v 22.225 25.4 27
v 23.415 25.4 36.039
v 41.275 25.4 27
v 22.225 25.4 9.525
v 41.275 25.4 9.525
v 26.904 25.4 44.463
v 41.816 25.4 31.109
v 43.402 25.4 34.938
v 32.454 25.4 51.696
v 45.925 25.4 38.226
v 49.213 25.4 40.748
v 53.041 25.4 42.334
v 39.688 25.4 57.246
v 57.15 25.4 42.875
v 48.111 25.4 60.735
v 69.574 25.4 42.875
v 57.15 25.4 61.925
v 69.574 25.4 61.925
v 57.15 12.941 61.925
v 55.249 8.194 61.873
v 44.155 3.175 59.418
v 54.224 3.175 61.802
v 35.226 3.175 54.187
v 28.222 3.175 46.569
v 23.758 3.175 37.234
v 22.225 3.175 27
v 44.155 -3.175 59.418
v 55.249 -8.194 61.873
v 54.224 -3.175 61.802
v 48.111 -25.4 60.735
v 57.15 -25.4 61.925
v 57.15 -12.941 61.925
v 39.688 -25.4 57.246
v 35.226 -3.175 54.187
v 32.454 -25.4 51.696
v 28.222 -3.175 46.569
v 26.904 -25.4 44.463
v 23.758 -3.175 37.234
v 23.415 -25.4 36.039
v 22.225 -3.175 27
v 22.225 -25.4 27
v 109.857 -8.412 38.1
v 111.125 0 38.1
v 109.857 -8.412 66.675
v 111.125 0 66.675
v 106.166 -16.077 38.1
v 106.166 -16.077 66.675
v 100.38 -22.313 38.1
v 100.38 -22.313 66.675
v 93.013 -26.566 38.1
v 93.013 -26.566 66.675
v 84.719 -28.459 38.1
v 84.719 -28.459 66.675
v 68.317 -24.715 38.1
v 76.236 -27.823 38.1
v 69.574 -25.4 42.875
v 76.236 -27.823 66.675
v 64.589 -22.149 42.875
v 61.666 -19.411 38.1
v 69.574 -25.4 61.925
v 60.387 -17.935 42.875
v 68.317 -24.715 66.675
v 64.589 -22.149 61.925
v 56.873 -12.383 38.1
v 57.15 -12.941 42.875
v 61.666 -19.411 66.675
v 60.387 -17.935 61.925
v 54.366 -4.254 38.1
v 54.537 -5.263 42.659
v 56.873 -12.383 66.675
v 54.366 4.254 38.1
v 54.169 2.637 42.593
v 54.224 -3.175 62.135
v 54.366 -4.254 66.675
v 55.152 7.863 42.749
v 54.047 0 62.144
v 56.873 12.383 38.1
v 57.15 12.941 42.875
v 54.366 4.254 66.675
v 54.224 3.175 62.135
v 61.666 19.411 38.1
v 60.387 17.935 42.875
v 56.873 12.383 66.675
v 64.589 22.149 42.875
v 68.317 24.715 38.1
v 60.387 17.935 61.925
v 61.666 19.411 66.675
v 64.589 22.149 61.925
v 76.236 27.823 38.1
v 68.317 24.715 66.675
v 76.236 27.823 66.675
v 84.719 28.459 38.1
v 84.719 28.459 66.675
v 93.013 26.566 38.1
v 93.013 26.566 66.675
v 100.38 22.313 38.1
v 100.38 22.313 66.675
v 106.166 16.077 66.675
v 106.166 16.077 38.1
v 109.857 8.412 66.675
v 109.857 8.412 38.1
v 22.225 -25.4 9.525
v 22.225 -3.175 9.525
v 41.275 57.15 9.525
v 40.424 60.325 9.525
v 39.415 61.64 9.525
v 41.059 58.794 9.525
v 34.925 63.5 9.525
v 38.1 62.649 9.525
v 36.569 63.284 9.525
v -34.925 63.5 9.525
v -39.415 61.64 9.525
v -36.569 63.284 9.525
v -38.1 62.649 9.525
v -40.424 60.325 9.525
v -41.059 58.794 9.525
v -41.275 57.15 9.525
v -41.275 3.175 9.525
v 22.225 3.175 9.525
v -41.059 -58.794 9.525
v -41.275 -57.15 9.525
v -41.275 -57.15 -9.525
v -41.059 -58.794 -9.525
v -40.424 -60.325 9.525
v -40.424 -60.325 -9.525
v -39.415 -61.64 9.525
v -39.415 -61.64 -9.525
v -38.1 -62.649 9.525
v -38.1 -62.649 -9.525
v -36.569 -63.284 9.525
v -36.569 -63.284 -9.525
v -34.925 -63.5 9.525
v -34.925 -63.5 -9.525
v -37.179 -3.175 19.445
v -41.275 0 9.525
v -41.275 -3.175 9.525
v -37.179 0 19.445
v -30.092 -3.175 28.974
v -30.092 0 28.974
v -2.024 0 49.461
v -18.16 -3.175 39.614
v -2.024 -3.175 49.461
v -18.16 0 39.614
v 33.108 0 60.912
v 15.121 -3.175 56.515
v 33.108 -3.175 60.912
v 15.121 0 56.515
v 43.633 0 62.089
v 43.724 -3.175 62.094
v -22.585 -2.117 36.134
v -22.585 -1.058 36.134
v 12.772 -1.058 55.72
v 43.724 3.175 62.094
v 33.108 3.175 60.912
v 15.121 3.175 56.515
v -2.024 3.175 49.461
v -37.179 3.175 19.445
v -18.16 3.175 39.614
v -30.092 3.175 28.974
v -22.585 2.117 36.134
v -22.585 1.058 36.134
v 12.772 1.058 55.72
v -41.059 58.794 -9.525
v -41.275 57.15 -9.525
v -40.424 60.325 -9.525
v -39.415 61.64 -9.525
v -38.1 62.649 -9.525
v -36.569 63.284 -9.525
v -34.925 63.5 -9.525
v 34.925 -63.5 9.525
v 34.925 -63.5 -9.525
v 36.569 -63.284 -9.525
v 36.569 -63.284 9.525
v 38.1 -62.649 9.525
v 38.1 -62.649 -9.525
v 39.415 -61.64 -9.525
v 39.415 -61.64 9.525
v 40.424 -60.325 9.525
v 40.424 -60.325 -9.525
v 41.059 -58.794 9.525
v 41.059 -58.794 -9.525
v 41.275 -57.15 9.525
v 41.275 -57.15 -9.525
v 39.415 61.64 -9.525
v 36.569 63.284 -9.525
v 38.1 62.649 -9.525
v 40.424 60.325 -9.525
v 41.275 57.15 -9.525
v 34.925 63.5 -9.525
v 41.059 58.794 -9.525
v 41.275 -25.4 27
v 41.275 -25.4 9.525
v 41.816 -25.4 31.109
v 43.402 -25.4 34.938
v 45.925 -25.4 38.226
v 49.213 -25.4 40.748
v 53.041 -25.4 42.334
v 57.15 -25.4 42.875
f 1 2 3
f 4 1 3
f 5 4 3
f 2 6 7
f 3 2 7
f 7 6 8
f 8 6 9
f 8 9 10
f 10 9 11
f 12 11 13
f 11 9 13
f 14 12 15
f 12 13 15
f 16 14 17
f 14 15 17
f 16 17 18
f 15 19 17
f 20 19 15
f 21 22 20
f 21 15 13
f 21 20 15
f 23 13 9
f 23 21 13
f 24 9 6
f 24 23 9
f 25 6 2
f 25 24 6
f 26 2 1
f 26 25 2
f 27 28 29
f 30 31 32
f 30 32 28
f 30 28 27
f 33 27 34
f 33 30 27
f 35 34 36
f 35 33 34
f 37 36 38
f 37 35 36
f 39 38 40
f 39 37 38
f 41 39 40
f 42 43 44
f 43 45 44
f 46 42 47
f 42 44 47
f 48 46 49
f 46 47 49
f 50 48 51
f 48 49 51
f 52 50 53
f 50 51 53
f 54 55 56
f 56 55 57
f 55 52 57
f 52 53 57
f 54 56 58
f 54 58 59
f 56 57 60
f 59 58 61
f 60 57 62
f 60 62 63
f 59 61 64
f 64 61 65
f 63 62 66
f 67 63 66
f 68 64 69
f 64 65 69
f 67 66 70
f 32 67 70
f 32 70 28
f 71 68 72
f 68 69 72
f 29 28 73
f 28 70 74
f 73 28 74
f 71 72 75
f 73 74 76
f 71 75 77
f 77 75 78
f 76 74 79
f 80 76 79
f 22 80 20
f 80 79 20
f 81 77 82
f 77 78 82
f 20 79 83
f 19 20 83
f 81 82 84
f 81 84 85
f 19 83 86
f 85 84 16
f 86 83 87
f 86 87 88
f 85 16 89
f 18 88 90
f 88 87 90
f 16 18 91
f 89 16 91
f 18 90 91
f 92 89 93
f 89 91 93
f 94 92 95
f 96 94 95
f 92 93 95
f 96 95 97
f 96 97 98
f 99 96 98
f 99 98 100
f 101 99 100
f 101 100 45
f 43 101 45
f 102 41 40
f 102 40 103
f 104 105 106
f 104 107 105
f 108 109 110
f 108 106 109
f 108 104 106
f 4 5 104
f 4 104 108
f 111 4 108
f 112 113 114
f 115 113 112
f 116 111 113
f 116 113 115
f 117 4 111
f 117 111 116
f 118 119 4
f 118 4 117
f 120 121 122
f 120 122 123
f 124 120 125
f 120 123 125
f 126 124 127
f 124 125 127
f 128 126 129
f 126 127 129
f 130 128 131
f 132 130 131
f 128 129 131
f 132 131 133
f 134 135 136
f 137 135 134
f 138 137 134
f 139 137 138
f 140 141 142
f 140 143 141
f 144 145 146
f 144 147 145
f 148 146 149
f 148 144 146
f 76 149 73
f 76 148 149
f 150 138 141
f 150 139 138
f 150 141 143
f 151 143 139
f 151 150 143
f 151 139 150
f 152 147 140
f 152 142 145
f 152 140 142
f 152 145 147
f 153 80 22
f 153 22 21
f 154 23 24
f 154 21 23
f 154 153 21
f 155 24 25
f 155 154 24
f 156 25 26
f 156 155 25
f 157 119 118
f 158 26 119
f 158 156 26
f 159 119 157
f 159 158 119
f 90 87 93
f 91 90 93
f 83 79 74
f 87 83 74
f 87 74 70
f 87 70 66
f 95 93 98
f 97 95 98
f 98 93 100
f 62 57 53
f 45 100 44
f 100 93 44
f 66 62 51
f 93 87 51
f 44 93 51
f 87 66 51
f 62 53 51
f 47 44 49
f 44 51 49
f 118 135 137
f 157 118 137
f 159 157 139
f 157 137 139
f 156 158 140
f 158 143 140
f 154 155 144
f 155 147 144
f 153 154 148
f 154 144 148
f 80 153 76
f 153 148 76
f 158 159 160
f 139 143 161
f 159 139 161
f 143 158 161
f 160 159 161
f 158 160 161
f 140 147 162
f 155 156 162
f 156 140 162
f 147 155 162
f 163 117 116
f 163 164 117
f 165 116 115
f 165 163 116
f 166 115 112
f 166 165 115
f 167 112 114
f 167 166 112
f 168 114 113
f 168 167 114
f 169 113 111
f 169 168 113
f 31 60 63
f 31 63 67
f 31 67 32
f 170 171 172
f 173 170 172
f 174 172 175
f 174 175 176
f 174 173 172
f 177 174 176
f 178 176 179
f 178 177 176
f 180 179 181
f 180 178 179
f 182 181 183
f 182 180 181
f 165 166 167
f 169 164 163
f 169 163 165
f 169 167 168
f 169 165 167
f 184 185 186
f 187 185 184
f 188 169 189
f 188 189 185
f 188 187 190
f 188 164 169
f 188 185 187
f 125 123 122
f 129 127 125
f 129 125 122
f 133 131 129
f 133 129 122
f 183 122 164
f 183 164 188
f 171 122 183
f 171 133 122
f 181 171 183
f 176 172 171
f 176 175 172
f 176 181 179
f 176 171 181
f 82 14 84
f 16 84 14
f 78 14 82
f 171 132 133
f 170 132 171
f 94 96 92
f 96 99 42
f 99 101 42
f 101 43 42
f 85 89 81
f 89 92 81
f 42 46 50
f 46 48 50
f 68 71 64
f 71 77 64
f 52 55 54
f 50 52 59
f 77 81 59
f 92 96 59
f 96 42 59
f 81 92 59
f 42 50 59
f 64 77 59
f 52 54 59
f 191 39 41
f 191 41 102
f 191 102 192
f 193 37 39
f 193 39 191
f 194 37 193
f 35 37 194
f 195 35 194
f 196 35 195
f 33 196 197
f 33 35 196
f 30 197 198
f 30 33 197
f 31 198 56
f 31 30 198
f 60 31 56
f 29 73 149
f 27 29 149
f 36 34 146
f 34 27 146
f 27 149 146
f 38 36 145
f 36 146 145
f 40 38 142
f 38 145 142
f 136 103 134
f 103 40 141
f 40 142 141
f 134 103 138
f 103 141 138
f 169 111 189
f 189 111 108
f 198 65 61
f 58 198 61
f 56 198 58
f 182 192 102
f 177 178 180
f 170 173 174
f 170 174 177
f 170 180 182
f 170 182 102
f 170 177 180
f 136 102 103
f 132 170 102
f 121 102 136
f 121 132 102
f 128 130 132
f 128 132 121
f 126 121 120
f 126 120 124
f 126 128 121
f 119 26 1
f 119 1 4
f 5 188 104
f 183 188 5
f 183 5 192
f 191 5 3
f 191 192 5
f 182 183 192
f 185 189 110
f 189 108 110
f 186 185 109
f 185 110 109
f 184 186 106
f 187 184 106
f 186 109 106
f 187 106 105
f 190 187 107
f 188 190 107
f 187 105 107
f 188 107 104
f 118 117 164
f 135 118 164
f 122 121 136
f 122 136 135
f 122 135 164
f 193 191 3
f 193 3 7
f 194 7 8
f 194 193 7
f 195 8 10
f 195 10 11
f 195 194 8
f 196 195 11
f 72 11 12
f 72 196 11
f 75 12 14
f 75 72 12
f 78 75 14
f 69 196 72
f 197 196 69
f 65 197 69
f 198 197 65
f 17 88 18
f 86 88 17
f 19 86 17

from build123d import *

# Parameters (mm, degrees)
F1_DEPTH = 63.5
F2_DEPTH = 3.175
F0_W     = 22.2610938409
F0_H     = 19.05
F3_DEPTH = 25.4
F5_DEPTH = 25.4
F6_R     = 6.35


with BuildPart() as f1:
    # F0 (on Front) → F1 (new body, symmetric)
    with BuildSketch(Plane.XZ):
        Polygon((-41.275, 9.525), (-41.275, -9.525), (41.275, -9.525), (41.275, 9.525), (22.225, 9.525), align=None)
    extrude(amount=F1_DEPTH, both=True)

    # F0 (on Front) → F2 (join, symmetric)
    with BuildSketch(Plane.XZ):
        with BuildLine():
            add(Edge.make_bspline(
                [(-41.275, 9.525), (-34.2779420316, 38.2648594677), (15.5508974567, 65.6356289983), (57.15, 61.9252)],
                knots=[0, 0, 0, 0, 111.5045361635, 111.5045361635, 111.5045361635, 111.5045361635], degree=3))
            Line((-41.275, 9.525), (22.225, 9.525))
            Line((22.225, 9.525), (22.225, 27.0002))
            ThreePointArc((22.225, 27.0002), (32.4542956671, 51.6959043329), (57.15, 61.9252))
        make_face()
    extrude(amount=F2_DEPTH, both=True)

    # F0 (on Front) → F3 (join, symmetric)
    with BuildSketch(Plane.XZ):
        with BuildLine():
            Line((22.225, 9.525), (41.275, 9.525))
            Line((41.275, 9.525), (41.275, 27.0002))
            ThreePointArc((41.275, 27.0002), (45.9246798487, 38.2255201513), (57.15, 42.8752))
            Line((57.15, 42.8752), (60.325, 42.8752))
            Line((60.325, 42.8752), (60.325, 61.9252))
            Line((60.325, 61.9252), (57.15, 61.9252))
            ThreePointArc((57.15, 61.9252), (32.4542956671, 51.6959043329), (22.225, 27.0002))
            Line((22.225, 27.0002), (22.225, 9.525))
        make_face()
        with Locations((71.4555469204, 52.4002)):
            Rectangle(F0_W, F0_H)
    extrude(amount=F3_DEPTH, both=True)

    # F0 (on Front) → F4 (revolve)
    with BuildSketch(Plane.XZ):
        Polygon((82.5860938409, 66.675), (82.5860938409, 61.9252), (82.5860938409, 42.8752), (82.5860938409, 38.1), (111.125, 38.1), (111.125, 66.675), align=None)
    revolve(axis=Axis((82.5860938409, 0, 52.3875), (0, 0, -1)))

    # F0 (on Front) → F5 (join, symmetric)
    with BuildSketch(Plane.XZ):
        with Locations((71.4555469204, 52.4002)):
            Rectangle(F0_W, F0_H)
    extrude(amount=F5_DEPTH, both=True)

    # F6
    f6_edges = [f1.edges().sort_by_distance(p)[0] for p in [
        (41.275, -63.5, 0),
        (-41.275, -63.5, 0),
        (-41.275, 63.5, 0),
        (41.275, 63.5, 0),
    ]]
    fillet(f6_edges, radius=F6_R)


solid = f1.part
